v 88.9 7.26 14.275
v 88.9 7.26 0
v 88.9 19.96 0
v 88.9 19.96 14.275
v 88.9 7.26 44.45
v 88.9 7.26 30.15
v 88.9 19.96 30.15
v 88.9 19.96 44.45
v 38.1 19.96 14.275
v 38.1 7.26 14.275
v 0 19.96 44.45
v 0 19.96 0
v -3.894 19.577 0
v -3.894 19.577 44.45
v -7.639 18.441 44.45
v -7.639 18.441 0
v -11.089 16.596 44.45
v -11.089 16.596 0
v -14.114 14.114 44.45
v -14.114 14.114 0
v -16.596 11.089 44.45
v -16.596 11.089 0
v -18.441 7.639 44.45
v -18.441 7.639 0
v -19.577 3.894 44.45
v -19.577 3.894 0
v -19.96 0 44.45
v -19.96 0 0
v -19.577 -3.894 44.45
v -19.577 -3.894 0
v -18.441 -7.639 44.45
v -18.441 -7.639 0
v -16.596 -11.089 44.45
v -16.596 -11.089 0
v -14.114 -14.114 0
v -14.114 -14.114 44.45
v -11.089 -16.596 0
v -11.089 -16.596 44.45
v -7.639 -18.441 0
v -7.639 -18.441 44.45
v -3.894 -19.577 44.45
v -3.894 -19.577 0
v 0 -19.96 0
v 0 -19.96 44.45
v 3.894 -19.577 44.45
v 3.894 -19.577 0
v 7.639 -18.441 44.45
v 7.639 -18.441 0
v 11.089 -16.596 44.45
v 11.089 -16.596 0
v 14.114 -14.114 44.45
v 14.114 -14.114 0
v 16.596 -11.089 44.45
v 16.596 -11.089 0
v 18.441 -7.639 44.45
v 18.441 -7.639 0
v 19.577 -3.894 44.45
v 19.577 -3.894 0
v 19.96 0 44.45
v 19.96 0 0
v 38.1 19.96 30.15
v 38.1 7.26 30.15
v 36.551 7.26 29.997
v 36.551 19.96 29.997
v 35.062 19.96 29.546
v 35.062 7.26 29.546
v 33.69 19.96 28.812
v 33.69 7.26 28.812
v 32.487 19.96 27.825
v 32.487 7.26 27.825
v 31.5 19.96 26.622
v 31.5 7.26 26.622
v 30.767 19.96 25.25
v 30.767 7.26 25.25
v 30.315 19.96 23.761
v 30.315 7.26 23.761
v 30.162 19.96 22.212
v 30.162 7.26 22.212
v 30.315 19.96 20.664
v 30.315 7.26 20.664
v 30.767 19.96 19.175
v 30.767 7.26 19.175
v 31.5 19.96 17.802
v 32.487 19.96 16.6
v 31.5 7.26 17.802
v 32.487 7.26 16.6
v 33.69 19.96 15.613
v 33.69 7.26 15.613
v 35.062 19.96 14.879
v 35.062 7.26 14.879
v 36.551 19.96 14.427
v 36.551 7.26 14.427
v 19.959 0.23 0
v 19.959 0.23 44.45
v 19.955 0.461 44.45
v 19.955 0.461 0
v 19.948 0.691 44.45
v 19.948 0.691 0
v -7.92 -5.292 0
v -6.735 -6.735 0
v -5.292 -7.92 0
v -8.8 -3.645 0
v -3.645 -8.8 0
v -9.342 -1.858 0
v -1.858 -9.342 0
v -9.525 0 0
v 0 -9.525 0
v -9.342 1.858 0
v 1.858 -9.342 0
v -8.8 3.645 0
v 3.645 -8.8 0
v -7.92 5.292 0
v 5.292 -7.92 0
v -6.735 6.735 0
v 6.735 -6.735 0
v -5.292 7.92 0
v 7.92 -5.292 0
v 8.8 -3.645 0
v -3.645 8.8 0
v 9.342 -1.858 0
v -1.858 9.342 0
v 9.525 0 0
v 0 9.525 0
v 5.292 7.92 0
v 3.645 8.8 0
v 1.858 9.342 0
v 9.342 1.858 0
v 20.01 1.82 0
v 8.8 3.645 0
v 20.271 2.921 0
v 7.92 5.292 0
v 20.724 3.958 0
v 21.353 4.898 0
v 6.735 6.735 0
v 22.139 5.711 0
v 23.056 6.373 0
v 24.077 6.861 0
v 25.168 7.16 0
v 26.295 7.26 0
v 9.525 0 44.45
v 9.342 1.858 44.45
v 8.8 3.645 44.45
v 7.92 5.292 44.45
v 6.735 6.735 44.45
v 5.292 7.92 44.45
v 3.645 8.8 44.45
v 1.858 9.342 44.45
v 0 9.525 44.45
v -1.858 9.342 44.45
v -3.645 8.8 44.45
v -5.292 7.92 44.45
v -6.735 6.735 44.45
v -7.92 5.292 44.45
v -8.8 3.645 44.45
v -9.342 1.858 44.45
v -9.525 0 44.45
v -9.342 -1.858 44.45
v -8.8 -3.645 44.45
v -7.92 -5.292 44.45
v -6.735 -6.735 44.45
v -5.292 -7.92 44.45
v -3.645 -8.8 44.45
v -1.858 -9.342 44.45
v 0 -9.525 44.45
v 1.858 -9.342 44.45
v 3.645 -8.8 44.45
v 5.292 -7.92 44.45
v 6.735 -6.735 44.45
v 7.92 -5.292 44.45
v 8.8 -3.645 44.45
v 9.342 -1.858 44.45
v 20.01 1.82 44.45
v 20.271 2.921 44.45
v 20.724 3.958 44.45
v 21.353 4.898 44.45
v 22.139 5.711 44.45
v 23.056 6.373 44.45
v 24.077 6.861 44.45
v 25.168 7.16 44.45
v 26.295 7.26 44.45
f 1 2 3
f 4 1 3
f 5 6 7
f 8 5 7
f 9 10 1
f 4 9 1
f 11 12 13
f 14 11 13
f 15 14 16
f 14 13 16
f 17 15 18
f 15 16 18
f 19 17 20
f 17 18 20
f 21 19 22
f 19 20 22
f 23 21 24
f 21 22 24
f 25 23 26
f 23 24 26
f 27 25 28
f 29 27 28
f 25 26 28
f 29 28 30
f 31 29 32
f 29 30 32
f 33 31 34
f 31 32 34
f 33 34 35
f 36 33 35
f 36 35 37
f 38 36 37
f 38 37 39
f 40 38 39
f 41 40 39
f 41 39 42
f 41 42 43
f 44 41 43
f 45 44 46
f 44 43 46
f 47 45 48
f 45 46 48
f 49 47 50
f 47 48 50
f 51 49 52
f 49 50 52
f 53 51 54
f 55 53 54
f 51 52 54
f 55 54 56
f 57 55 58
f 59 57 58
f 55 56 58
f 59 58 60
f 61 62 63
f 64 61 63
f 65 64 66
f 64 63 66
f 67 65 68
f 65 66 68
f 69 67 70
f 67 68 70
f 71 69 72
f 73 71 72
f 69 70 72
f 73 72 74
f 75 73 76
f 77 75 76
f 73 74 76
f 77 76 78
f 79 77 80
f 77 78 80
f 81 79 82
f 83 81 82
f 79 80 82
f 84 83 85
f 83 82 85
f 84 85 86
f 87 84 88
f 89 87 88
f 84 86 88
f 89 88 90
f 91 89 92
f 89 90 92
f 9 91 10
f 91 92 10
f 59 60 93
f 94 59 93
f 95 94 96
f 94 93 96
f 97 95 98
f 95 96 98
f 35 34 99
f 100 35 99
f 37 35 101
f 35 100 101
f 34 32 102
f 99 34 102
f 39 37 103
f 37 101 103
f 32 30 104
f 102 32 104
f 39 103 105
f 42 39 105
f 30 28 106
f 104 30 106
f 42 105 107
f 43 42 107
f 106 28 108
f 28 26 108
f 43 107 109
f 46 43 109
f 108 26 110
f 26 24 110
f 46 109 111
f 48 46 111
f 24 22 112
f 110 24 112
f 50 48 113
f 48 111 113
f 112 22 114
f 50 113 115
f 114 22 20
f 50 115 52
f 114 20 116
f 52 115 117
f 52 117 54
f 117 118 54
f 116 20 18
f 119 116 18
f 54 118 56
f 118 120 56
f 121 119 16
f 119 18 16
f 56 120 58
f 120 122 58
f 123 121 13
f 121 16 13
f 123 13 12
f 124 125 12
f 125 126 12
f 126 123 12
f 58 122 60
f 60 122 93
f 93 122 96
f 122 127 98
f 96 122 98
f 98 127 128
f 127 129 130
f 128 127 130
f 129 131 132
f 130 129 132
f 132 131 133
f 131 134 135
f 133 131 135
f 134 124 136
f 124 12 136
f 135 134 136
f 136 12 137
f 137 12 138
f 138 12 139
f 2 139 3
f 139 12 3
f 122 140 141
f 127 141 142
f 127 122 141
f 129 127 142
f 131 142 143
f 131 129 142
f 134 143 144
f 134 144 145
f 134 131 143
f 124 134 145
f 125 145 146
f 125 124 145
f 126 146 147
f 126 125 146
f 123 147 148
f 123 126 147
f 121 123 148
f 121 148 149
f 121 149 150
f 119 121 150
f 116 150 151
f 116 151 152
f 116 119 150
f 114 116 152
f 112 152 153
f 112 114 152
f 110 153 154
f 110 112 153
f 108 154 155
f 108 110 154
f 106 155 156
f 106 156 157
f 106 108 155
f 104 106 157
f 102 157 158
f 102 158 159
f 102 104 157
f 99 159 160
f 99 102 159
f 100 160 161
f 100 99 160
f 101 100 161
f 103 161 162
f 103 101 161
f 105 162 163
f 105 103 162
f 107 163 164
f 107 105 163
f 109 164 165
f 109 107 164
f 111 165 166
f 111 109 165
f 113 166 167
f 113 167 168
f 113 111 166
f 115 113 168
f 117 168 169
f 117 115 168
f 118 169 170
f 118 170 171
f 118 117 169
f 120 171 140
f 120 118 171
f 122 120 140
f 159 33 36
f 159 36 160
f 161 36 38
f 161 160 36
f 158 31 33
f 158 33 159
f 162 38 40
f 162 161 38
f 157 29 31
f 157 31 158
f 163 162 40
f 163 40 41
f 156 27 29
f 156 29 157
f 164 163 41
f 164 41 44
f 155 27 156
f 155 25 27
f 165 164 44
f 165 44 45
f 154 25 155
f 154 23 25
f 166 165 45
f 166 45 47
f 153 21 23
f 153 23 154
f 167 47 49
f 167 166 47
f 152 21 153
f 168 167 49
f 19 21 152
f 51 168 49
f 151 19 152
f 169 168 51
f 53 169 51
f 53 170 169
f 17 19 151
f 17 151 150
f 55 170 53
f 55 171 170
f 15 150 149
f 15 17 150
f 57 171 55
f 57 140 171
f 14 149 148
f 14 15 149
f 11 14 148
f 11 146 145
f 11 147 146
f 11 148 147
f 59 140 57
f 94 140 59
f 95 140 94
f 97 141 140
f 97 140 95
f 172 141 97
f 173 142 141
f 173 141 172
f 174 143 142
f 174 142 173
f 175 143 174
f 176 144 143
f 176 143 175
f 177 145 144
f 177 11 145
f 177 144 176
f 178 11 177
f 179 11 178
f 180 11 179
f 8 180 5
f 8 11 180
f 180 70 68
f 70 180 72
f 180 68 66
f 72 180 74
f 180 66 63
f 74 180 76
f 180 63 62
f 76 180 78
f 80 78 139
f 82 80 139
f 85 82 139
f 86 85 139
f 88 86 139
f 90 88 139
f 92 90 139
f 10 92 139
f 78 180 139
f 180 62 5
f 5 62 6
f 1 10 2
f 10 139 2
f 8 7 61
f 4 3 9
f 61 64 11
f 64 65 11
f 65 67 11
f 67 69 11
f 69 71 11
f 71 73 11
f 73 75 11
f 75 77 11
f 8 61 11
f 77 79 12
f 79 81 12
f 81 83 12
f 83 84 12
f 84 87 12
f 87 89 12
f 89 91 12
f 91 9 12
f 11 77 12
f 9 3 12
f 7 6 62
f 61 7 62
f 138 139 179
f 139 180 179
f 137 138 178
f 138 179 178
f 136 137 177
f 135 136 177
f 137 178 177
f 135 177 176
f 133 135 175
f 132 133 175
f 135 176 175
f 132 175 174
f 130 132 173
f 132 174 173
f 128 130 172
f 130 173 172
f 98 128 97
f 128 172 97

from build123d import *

# Parameters (mm, degrees)
F0_R     = 9.525
F1_DEPTH = 44.45
F3_DEPTH = 12.7
F4_R     = 6.35


with BuildPart() as f1:
    # F0 (on Top) → F1 (new body)
    with BuildSketch(Plane.XY):
        with BuildLine():
            ThreePointArc((0, 19.960436), (11.258275, 16.482422), (18.593146, 7.260436))
            Line((18.593146, 7.260436), (88.9, 7.260436))
            Line((88.9, 7.260436), (88.9, 19.960436))
            Line((88.9, 19.960436), (0, 19.960436))
        make_face()
        with BuildLine():
            ThreePointArc((0, 19.960436), (-14.114159, -14.114159), (19.960436, 0))
            ThreePointArc((19.960436, 0), (19.615635, 3.694029), (18.593146, 7.260436))
            ThreePointArc((18.593146, 7.260436), (11.258275, 16.482422), (0, 19.960436))
        make_face()
        Circle(F0_R, mode=Mode.SUBTRACT)
    extrude(amount=F1_DEPTH)

    # F2 (on face) → F3 (cut)
    with BuildSketch(Plane.XZ.offset(-7.260436)):
        with BuildLine():
            Line((88.9, 14.2748), (88.9, 30.1498))
            Line((88.9, 30.1498), (38.1, 30.1498))
            ThreePointArc((38.1, 30.1498), (43.71266, 27.82496), (46.0375, 22.2123))
            ThreePointArc((46.0375, 22.2123), (43.71266, 16.59964), (38.1, 14.2748))
            Line((38.1, 14.2748), (88.9, 14.2748))
        make_face()
        with BuildLine():
            Line((38.1, 14.2748), (38.1, 30.1498))
            ThreePointArc((38.1, 30.1498), (30.1625, 22.2123), (38.1, 14.2748))
        make_face()
        with BuildLine():
            ThreePointArc((46.0375, 22.2123), (43.71266, 27.82496), (38.1, 30.1498))
            Line((38.1, 30.1498), (38.1, 14.2748))
            ThreePointArc((38.1, 14.2748), (43.71266, 16.59964), (46.0375, 22.2123))
        make_face()
    extrude(amount=-F3_DEPTH, mode=Mode.SUBTRACT)

    # F4
    f4_edges = [f1.edges().sort_by_distance(p)[0] for p in [
        (18.593146, 7.260436, 22.225),
    ]]
    fillet(f4_edges, radius=F4_R)


solid = f1.part
